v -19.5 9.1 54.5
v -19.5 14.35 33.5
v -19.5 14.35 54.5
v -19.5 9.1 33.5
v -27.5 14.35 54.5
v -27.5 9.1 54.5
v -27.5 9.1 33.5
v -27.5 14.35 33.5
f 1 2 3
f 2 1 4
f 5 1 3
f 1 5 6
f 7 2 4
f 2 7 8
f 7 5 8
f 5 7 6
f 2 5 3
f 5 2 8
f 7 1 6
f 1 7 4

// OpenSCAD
// file: D:/Projects/assembly-workshop/outputs/Screen_Pi_Hue_SCR5-H_2026-10-30/checks/geometry.scad
// SCR5-G; mm; FRONT view: X right, Z up, Y into rack. Glass/plate front Y=0.
// Measured values: work/screen-5in/Dimensions.md. Physical fit/strength UNKNOWN.
part="plate";
DROP=0.45; // coupon winner can be substituted here; all three pins use this DROP
LIP=0.8; LIP_ON=true;
LIP_EDGES=[true,true,false,false]; // left,right,bottom,top; Brian: side lips only, cosmetic
FRAME_STEP=1.5; // measured glass-edge inset to metal LCD frame, left/right only
SHIM=0; // moves rear frame seat and plate-boss mating face back
$fn=48;
GCX=33; GCZ=41.5; PW=252; PH=88.8; PT=4;
GW=120.7; GH=77.2; CLEAR=0.2; WW=GW+2*CLEAR; WH=GH+2*CLEAR;
SEAT=13.3+SHIM; FT=3;
SO=[56.45,34]; BTN_X=[45.5,35.5,25.5];
PCB_TOP=38; GAP=0.10; LEAF_T=0.8;
HOLE=[3.4,40.3,44.7];
BX=[GCX-68,GCX+68]; BZ=[10,72];
// DSI connector X extent is unmeasured: conservative assumed 8 mm inward from PCB edge.
DSI=[GCX-60.5,9.1,GCZ-38+30,8,5.25,21];
module xz(y,d){translate([0,y+d,0])rotate([90,0,0])linear_extrude(d)children();}
// rr/rack_slots copied from SCR5-F; same exact slot centres, outline shifted -0.05 Z to centre 44.4.
module rr(w,h,r){hull()for(x=[-w/2+r,w/2-r],z=[-h/2+r,h/2-r])translate([x,z])circle(r=r);}
module rack_slots(){for(x=[-118.2625,118.2625],z=[6.323,38.127,50.773,82.577])translate([x,z])hull()for(dx=[-1.5,1.5])translate([dx,0])circle(d=7);}
module cyl_y(x,y,z,d,h){translate([x,y,z])rotate([-90,0,0])cylinder(d=d,h=h);}
module window_cut(){
  xz(-0.02,4.04)translate([GCX,GCZ])square([WW,WH],center=true);
  // 0.3 x 45-degree chamfer, square corners, front only.
  translate([GCX,0.3,GCZ])rotate([90,0,0])
    linear_extrude(height=0.3,scale=[(WW+0.6)/WW,(WH+0.6)/WH])square([WW,WH],center=true);
}
module lips(){
  // Cosmetic side ledges only; rear frame/standoffs set depth and retain the screen.
  if(LIP_ON)for(i=[0:3])if(LIP_EDGES[i]){
    if(i<2)translate([GCX+(i==0?-WW/2:WW/2-LIP),2.5,GCZ-GH/2+4])cube([LIP,0.8,GH-8]);
    else translate([GCX-GW/2+4,2.5,GCZ+(i==2?-WH/2:WH/2-LIP)])cube([GW-8,0.8,LIP]);
  }
}
// Leaf/nub/bump geometry copied from SCR5-WP-A, translated to this glass centre.
module leaves(){for(x=BTN_X)translate([GCX+x-1.5,0,GCZ]){
  translate([0,0,PCB_TOP+GAP+0.9+0.1])cube([3,11.8,LEAF_T]);
  translate([0,10.2,PCB_TOP+GAP])cube([3,1.4,1.0+LEAF_T/2]);
  translate([0,10.4,PCB_TOP+GAP+1.0+LEAF_T])cube([3,1.0,0.9]);
}}
module plate(){difference(){union(){
  difference(){xz(0,PT)translate([0,PH/2])rr(PW,PH,2.5);window_cut();}
  for(x=BX,z=BZ)cyl_y(x,3.9,z,8,SEAT-3.9);
  leaves(); lips();
 }
 xz(-0.02,4.04)rack_slots();
 for(x=BTN_X)translate([GCX+x-HOLE[0]/2,-0.02,GCZ+HOLE[1]])cube([HOLE[0],SEAT+FT+0.04,HOLE[2]-HOLE[1]]);
 // Printed-in screw pilots (no heat-set OD assumption): nominal M2.5, fit UNKNOWN.
 for(x=BX,z=BZ)cyl_y(x,SEAT-6,z,2.1,6.02);
 // Rear engraving, 0.5 deep, left field.
 xz(3.5,0.52)translate([-75,40])mirror([1,0])text("SCR5-G",size=6,halign="center",font="Liberation Sans:style=Bold");
}}
module frame_blank(){
  // C-shaped perimeter; no material across the board centre / touch FPC.
  xz(SEAT,FT)translate([GCX,GCZ])difference(){square([132,76],center=true);square([116,60],center=true);}
  for(sx=[-1,1],sz=[-1,1])cyl_y(GCX+sx*SO[0],SEAT,GCZ+sz*SO[1],9,FT);
  for(x=BX,z=BZ)hull(){cyl_y(x,SEAT,z,8,FT);cyl_y(GCX+(x<GCX?-62:62),SEAT,z,8,FT);}
}
module dsi_keepout(){translate([DSI[0]-3,DSI[1]-3,DSI[2]-3])cube([DSI[3]+6,DSI[4]+6,DSI[5]+6]);}
module ribbon_route(){
  // Open left/up corridor 18 mm wide; extends past top of plate.
  translate([GCX-84,6.1,GCZ-11])cube([18,24,65]);
  translate([GCX-84,6.1,GCZ-11])cube([32,24,27]);
}
module frame(){difference(){frame_blank();dsi_keepout();ribbon_route();
 for(sx=[-1,1],sz=[-1,1])cyl_y(GCX+sx*SO[0],SEAT-0.02,GCZ+sz*SO[1],2.8,FT+0.04);
 for(x=BX,z=BZ)cyl_y(x,SEAT-0.02,z,2.8,FT+0.04);
}}
// Pin polygon/cap/notch/dot design copied unchanged from SCR5-WP-A.
module pin(d,dots){s=2*d+0.5;difference(){union(){
 translate([-1.5,0,0])rotate([90,0,90])linear_extrude(3)polygon([
 [-s-0.02,40.5],[10.2,40.5],[10.2,41.0],[11.5,41.0],[11.5+2*d,41.0-d],[15,41.0-d],[15,44.5],[-s-0.02,44.5]]);
 translate([-2.5,-s-1.5,39.6])cube([5,1.5,5.8]);
 }for(i=[0:dots-1])translate([(i-(dots-1)/2)*1.4,-s-1.5-0.01,43.5])rotate([-90,0,0])cylinder(d=0.9,h=0.4);}}
module placed_pin(i){translate([GCX+BTN_X[i],0,GCZ])pin(DROP,i+1);}
// Measured layers: cover glass 0.9 + second glass 1.6, metal frame 3.0,
// open gap 2.0, PCB 1.6. Metal frame inset ~1.5 at LEFT/RIGHT only.
// PCB centred under glass and full metal-frame top/bottom extent remain UNKNOWN.
module glass(){translate([GCX-GW/2,0,GCZ-GH/2])cube([GW,2.5,GH]);}
module lcd(){
  translate([GCX-GW/2+FRAME_STEP,2.5,GCZ-GH/2])cube([GW-2*FRAME_STEP,3.0,GH]);
}
module pcb(){translate([GCX-60.5,7.5,GCZ-38])cube([121,1.6,76]);}
module standoffs(){for(sx=[-1,1],sz=[-1,1])difference(){cyl_y(GCX+sx*SO[0],9.1,GCZ+sz*SO[1],5.5,4.2);cyl_y(GCX+sx*SO[0],9.08,GCZ+sz*SO[1],2.5,4.24);}}
module buttons(){for(x=BTN_X){
 translate([GCX+x-3.5,9.1,GCZ+38-3.4])cube([7,3.6,2.4]);
 translate([GCX+x-1.5,9.1,GCZ+37])cube([3,3.6,1]);
}}
module dsi(){translate([DSI[0],DSI[1],DSI[2]])cube([DSI[3],DSI[4],DSI[5]]);}
module touch(){translate([GCX-10,9.1,GCZ-5])cube([20,2,10]);} // lateral extent unmeasured
module dummy(){glass();lcd();pcb();standoffs();buttons();dsi();touch();}
module assembly(){color("gray")plate();color("orange")frame();for(i=[0:2])color("cyan")placed_pin(i);color([0.2,0.3,0.4,0.4])dummy();}
// main file
include <D:/Projects/assembly-workshop/outputs/Screen_Pi_Hue_SCR5-H_2026-10-30/checks/geometry.scad>
intersection(){dsi();ribbon_route();}
